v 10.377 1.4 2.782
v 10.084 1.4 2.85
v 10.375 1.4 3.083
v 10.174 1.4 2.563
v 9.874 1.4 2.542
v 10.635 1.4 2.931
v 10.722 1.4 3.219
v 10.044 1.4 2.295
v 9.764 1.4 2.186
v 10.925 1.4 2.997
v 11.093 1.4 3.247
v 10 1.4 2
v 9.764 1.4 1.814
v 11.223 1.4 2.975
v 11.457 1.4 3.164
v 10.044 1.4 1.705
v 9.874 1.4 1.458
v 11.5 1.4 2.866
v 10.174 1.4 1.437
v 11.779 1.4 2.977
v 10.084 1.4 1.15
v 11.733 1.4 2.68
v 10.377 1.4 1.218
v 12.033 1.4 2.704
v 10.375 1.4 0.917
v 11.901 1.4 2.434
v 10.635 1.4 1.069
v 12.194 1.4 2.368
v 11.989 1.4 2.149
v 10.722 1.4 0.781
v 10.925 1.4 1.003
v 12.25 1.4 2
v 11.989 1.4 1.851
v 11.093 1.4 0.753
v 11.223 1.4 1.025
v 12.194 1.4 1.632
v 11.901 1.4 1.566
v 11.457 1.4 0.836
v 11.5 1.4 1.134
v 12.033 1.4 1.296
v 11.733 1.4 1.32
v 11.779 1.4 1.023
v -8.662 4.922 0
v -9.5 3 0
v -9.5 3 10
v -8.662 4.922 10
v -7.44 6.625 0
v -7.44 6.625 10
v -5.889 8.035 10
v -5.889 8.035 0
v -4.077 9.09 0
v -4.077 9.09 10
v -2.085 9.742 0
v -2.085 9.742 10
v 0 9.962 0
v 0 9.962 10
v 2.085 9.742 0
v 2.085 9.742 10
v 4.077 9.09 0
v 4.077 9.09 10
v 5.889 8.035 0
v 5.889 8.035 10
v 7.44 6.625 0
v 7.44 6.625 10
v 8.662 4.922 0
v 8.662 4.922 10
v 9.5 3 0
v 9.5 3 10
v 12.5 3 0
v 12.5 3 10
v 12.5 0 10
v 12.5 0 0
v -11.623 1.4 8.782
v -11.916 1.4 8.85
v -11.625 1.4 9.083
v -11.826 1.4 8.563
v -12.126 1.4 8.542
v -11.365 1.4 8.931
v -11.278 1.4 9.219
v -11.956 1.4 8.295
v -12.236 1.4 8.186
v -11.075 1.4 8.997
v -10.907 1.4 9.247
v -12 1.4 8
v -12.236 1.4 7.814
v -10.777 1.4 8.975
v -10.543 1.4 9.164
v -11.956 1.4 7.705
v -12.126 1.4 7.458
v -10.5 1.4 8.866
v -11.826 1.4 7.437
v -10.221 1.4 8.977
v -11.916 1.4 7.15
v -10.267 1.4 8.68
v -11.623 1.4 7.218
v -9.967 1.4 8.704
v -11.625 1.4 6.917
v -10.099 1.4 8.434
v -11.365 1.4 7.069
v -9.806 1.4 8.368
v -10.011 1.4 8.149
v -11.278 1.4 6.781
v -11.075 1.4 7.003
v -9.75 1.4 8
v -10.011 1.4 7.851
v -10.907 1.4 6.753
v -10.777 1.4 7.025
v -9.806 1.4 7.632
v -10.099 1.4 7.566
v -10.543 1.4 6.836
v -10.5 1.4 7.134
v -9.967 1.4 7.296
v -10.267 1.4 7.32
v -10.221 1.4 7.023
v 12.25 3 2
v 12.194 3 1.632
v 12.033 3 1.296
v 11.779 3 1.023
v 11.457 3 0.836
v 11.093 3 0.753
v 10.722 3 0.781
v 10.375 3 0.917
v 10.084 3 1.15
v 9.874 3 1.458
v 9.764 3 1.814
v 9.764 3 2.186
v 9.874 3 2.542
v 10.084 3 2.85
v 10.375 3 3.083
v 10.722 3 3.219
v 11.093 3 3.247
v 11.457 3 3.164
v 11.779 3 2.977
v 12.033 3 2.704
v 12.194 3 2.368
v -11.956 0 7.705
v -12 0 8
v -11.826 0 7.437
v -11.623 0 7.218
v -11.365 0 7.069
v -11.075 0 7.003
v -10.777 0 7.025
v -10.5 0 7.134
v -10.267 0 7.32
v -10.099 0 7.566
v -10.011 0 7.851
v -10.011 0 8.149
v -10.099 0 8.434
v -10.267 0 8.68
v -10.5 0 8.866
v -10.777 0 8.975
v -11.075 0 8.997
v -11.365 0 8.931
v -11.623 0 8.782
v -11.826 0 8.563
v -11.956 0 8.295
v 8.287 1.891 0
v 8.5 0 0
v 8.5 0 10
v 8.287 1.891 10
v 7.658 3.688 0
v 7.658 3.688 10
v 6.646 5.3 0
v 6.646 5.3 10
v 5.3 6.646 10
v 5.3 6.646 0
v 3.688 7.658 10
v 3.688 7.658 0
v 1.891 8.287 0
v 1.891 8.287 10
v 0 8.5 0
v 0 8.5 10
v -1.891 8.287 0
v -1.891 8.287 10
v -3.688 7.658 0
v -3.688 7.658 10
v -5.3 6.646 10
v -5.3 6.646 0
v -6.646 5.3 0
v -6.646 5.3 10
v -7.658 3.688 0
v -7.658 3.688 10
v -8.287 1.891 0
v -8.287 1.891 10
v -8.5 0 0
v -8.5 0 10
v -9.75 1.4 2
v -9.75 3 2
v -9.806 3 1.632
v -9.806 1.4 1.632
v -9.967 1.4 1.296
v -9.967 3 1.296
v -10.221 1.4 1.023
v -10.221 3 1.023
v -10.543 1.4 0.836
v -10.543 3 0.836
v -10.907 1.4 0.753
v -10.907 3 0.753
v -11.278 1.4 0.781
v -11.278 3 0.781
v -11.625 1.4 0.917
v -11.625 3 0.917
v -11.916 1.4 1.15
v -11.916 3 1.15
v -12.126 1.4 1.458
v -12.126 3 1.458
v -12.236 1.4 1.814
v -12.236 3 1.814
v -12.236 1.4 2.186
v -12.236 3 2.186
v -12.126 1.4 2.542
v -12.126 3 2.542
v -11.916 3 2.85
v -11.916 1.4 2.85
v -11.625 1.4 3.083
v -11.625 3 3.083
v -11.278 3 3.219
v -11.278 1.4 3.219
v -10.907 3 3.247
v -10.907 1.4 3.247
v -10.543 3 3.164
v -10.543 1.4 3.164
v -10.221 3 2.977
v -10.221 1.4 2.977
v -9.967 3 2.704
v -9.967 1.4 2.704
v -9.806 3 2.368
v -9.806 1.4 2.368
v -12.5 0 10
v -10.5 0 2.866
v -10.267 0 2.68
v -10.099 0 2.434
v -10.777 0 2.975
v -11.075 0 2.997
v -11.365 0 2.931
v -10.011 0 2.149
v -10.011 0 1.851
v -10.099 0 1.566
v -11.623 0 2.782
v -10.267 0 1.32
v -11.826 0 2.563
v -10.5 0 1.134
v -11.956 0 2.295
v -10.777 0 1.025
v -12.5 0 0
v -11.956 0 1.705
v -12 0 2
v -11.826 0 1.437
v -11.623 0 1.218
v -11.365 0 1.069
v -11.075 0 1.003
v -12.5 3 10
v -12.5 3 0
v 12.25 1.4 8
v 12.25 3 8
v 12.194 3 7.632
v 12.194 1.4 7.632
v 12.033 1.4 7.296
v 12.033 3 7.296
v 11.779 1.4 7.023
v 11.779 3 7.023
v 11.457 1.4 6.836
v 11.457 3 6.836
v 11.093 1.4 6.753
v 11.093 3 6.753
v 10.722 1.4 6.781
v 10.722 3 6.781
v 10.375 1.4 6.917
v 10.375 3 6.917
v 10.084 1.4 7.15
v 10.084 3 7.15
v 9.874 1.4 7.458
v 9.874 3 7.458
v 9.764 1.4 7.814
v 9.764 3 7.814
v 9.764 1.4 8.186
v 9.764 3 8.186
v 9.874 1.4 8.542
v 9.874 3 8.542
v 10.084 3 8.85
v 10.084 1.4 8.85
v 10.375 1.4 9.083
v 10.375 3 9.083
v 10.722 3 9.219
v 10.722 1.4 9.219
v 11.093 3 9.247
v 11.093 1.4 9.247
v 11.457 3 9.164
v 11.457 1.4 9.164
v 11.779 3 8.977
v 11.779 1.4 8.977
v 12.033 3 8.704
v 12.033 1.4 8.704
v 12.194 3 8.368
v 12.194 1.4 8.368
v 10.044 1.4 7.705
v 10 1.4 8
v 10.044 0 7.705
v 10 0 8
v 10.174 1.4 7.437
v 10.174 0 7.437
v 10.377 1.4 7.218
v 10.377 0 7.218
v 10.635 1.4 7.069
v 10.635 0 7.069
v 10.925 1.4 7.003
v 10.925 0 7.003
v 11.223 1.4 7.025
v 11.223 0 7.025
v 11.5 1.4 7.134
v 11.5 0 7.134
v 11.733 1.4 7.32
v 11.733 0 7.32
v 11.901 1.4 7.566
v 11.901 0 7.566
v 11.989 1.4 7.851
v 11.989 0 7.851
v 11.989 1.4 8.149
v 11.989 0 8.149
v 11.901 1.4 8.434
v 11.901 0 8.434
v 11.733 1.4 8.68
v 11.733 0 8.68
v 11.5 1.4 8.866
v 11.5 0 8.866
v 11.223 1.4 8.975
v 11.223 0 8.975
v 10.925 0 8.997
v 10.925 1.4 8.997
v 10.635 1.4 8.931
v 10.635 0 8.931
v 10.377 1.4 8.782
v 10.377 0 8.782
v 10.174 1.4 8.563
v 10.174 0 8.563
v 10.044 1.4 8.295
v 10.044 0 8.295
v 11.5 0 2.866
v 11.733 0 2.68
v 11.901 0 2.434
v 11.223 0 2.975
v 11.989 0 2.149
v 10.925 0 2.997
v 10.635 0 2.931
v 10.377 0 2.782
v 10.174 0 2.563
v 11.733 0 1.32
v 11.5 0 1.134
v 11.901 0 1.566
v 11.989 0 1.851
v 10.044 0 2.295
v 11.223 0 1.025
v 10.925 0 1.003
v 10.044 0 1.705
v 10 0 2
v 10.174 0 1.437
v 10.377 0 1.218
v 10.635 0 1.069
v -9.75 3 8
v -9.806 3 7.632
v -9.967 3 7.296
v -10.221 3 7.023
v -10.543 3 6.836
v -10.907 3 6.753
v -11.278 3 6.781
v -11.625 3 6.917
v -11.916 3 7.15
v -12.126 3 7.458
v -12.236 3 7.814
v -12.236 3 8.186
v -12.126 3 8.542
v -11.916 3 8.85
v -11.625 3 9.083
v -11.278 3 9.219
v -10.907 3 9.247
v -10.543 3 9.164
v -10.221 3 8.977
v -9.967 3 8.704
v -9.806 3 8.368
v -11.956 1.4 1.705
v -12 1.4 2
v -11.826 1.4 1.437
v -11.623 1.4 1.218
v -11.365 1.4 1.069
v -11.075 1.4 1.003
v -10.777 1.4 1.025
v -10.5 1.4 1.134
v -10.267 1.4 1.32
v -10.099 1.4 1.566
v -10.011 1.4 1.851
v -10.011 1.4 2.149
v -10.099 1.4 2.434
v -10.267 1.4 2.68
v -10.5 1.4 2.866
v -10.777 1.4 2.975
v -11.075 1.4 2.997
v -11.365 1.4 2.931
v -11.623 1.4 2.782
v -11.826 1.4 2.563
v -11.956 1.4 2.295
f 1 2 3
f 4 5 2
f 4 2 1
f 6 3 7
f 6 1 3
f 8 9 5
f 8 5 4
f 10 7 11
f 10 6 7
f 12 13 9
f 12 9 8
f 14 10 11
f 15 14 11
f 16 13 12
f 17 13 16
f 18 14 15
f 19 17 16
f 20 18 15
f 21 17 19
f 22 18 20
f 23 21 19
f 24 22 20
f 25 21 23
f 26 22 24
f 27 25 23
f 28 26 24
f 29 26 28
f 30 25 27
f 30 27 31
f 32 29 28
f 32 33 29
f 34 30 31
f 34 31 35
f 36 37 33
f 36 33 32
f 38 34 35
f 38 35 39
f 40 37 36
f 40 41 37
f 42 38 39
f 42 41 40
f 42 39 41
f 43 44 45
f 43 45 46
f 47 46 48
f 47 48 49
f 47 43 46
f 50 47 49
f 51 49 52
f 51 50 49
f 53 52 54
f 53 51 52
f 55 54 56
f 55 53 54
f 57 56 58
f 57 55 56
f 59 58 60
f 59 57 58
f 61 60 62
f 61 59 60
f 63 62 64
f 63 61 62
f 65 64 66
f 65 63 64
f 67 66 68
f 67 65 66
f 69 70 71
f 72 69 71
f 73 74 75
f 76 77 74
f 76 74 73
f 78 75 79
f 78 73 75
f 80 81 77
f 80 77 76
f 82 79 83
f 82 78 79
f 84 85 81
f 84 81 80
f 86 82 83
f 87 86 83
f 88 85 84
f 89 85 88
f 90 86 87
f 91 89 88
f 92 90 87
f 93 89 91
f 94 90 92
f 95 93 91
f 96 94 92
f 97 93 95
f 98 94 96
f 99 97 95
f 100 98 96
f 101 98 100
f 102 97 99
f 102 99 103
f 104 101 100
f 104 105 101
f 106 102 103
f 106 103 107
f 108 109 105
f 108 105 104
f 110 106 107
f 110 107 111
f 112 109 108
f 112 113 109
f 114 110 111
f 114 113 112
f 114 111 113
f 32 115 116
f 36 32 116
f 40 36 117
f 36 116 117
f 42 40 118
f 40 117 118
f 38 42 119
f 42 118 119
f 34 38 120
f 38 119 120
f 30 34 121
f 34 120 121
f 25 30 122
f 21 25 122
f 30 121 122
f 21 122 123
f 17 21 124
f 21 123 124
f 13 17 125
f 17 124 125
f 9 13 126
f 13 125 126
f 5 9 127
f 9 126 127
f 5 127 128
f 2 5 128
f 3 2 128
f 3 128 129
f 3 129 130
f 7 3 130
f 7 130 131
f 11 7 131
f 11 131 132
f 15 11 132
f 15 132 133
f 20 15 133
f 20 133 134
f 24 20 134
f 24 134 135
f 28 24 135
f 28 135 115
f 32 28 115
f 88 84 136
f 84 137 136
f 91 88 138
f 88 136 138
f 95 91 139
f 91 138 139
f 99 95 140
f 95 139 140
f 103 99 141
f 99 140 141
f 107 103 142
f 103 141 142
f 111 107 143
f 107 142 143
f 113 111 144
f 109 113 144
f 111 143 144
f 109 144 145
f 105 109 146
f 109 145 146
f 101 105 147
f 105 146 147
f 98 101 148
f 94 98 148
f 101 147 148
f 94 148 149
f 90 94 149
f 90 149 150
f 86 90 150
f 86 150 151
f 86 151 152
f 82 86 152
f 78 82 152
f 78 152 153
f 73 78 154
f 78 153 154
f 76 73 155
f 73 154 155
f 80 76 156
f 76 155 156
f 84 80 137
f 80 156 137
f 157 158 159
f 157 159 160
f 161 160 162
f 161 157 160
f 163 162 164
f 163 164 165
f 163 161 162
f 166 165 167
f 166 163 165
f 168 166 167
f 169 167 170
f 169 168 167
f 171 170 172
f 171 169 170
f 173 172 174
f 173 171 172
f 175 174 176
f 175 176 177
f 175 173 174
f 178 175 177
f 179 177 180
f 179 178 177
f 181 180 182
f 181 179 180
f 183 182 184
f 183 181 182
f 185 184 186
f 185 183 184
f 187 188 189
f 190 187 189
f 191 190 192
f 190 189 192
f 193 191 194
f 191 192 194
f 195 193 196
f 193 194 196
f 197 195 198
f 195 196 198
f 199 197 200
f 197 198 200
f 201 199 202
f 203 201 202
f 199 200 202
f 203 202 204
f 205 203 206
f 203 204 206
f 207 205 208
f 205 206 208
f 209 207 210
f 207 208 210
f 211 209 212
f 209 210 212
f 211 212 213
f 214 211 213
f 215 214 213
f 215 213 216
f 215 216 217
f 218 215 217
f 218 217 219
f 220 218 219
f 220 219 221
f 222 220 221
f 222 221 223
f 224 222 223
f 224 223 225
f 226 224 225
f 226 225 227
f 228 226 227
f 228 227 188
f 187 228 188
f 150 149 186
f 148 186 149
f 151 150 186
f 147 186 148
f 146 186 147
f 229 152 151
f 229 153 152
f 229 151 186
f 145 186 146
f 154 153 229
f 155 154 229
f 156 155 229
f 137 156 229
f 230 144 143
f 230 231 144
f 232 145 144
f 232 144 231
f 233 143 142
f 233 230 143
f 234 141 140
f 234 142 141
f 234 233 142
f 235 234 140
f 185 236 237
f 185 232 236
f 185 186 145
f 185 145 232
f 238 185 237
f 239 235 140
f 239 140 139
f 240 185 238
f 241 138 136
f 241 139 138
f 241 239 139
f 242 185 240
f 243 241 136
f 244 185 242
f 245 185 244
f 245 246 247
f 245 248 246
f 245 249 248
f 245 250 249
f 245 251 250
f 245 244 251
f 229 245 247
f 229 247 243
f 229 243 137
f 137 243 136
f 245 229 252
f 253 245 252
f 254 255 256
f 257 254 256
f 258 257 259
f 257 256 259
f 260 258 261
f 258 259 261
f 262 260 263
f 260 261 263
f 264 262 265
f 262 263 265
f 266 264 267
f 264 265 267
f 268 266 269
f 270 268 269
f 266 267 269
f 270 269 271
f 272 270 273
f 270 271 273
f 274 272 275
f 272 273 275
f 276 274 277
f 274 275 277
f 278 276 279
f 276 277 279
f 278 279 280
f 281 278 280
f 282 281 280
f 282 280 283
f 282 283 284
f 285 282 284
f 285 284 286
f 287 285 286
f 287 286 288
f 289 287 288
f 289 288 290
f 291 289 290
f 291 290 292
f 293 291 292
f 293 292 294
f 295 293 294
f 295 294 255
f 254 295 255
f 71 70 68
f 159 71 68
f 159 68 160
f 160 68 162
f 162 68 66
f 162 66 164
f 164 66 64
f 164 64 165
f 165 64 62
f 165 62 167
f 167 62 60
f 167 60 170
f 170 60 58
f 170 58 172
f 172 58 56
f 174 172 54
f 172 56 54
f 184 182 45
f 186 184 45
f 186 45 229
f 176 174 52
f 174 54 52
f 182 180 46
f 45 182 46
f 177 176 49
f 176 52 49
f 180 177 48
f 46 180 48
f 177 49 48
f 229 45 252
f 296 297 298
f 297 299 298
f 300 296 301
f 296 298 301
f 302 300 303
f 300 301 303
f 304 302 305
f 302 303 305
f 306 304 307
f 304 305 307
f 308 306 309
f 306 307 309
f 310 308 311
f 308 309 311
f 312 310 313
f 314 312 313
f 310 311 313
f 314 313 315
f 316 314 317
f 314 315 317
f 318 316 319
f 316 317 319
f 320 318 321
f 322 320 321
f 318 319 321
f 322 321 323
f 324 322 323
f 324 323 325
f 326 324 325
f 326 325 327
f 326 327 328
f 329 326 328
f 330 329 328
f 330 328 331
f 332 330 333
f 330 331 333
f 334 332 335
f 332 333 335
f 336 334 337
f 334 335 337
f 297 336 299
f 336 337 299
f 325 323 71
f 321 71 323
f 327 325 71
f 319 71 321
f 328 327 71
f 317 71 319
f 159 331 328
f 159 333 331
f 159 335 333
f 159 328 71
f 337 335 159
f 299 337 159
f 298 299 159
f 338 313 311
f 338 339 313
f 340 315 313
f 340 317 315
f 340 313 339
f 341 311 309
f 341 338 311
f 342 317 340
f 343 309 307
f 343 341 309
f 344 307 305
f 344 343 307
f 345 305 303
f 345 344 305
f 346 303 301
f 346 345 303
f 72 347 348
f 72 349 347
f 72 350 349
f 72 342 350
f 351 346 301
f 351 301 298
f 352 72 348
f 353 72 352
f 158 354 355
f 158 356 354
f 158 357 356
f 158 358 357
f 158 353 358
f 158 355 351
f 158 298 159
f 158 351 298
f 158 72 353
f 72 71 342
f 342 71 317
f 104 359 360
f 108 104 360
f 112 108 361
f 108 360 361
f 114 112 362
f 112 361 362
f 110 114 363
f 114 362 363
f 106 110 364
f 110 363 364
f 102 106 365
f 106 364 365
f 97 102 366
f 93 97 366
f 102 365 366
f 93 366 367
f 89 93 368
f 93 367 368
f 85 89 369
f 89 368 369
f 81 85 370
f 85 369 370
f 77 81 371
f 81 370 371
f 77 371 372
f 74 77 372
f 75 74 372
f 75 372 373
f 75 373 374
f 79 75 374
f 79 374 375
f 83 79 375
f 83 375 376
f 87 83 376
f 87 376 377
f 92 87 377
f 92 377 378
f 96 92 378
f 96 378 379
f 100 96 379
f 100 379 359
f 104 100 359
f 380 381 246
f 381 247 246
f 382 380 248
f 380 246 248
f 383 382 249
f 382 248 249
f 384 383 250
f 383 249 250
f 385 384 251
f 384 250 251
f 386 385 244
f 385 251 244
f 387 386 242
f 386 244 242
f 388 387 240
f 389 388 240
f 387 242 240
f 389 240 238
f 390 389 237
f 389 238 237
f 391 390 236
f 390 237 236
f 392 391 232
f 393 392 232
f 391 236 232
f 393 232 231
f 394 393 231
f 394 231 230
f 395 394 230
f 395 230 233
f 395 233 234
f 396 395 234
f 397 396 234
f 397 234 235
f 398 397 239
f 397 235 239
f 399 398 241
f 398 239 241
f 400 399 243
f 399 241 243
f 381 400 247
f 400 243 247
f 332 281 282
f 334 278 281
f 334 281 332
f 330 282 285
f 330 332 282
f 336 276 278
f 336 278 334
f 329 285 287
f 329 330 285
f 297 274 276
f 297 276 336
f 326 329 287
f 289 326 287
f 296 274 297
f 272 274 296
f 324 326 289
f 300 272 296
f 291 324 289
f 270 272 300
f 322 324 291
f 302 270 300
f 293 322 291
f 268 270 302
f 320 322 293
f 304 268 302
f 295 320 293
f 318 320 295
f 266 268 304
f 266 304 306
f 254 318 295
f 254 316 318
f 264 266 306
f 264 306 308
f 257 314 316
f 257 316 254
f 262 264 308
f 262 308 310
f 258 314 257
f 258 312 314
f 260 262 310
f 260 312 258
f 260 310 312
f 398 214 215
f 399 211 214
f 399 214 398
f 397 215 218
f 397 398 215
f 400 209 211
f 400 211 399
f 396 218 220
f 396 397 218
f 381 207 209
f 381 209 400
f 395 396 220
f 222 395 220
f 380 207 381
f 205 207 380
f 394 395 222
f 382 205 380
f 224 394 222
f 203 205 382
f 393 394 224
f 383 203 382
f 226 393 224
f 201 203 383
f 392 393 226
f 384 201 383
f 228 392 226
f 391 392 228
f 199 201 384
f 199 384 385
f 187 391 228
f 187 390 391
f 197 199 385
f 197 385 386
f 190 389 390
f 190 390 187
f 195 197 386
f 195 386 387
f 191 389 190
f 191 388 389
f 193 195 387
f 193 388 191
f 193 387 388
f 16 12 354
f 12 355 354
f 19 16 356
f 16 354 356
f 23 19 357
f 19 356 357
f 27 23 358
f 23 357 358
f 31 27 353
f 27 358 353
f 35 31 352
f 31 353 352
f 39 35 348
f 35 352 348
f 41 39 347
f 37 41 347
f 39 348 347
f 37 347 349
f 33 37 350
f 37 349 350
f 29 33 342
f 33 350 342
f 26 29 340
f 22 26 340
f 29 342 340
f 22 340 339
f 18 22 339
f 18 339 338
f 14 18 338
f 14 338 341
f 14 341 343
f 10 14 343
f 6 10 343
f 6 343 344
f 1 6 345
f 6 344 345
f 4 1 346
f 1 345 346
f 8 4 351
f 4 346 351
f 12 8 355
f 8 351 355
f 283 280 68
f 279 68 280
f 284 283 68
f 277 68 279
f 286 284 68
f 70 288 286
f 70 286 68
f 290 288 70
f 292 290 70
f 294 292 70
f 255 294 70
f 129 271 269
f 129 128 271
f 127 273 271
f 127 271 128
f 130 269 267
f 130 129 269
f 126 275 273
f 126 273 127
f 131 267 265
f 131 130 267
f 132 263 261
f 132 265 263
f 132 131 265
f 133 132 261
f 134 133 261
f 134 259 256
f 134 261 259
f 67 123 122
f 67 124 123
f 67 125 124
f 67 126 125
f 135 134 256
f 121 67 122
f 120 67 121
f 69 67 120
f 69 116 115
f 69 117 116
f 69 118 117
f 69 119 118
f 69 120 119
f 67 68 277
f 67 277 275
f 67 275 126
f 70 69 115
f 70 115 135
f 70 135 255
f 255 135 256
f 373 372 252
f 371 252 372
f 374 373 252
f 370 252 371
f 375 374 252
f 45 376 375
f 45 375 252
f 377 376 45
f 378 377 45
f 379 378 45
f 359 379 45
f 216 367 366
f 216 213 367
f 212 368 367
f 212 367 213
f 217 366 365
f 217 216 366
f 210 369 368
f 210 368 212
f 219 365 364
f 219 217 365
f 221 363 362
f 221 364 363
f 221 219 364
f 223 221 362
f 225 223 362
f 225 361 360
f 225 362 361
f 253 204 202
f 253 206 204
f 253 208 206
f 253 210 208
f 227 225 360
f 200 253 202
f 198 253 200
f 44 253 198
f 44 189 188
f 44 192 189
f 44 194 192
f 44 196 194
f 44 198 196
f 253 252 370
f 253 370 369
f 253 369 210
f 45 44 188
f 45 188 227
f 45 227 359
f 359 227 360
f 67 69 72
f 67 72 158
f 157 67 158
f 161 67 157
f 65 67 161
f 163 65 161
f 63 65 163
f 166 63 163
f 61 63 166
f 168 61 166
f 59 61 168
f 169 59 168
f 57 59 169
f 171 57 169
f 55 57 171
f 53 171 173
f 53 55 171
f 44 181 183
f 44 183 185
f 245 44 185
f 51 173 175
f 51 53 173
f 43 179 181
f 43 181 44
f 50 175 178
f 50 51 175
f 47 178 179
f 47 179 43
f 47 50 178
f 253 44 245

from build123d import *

# Parameters (mm, degrees)
SALIENTE_EXTRUIR1_DEPTH                              = 10
REFRENTADO_PARA_TORNILLO_CON_CABEZA_TRON_D           = 2
REFRENTADO_PARA_TORNILLO_CON_CABEZA_TRON_CBORE_D     = 2.5
REFRENTADO_PARA_TORNILLO_CON_CABEZA_TRON_CBORE_DEPTH = 1.6


with BuildPart() as part:
    # Croquis1 → Saliente-Extruir1 (new body)
    with BuildSketch(Plane.XY):
        with BuildLine():
            ThreePointArc((-9.5, 3), (0, 9.962429423), (9.5, 3))
            Line((9.5, 3), (12.5, 3))
            Line((12.5, 3), (12.5, 0))
            Line((12.5, 0), (8.5, 0))
            ThreePointArc((8.5, 0), (0, 8.5), (-8.5, 0))
            Line((-8.5, 0), (-12.5, 0))
            Line((-12.5, 0), (-12.5, 3))
            Line((-12.5, 3), (-9.5, 3))
        make_face()
    extrude(amount=SALIENTE_EXTRUIR1_DEPTH)

    # Refrentado para tornillo con cabeza troncocónica de M23 (through all)
    with Locations(Plane(origin=(-11, 3, 2), x_dir=(1, 0, 0), z_dir=(0, 1, 0))):
        with Locations((0, 0), (0, -6), (22, 0), (22, -6)):
            CounterBoreHole(REFRENTADO_PARA_TORNILLO_CON_CABEZA_TRON_D / 2, REFRENTADO_PARA_TORNILLO_CON_CABEZA_TRON_CBORE_D / 2, REFRENTADO_PARA_TORNILLO_CON_CABEZA_TRON_CBORE_DEPTH)


solid = part.part
